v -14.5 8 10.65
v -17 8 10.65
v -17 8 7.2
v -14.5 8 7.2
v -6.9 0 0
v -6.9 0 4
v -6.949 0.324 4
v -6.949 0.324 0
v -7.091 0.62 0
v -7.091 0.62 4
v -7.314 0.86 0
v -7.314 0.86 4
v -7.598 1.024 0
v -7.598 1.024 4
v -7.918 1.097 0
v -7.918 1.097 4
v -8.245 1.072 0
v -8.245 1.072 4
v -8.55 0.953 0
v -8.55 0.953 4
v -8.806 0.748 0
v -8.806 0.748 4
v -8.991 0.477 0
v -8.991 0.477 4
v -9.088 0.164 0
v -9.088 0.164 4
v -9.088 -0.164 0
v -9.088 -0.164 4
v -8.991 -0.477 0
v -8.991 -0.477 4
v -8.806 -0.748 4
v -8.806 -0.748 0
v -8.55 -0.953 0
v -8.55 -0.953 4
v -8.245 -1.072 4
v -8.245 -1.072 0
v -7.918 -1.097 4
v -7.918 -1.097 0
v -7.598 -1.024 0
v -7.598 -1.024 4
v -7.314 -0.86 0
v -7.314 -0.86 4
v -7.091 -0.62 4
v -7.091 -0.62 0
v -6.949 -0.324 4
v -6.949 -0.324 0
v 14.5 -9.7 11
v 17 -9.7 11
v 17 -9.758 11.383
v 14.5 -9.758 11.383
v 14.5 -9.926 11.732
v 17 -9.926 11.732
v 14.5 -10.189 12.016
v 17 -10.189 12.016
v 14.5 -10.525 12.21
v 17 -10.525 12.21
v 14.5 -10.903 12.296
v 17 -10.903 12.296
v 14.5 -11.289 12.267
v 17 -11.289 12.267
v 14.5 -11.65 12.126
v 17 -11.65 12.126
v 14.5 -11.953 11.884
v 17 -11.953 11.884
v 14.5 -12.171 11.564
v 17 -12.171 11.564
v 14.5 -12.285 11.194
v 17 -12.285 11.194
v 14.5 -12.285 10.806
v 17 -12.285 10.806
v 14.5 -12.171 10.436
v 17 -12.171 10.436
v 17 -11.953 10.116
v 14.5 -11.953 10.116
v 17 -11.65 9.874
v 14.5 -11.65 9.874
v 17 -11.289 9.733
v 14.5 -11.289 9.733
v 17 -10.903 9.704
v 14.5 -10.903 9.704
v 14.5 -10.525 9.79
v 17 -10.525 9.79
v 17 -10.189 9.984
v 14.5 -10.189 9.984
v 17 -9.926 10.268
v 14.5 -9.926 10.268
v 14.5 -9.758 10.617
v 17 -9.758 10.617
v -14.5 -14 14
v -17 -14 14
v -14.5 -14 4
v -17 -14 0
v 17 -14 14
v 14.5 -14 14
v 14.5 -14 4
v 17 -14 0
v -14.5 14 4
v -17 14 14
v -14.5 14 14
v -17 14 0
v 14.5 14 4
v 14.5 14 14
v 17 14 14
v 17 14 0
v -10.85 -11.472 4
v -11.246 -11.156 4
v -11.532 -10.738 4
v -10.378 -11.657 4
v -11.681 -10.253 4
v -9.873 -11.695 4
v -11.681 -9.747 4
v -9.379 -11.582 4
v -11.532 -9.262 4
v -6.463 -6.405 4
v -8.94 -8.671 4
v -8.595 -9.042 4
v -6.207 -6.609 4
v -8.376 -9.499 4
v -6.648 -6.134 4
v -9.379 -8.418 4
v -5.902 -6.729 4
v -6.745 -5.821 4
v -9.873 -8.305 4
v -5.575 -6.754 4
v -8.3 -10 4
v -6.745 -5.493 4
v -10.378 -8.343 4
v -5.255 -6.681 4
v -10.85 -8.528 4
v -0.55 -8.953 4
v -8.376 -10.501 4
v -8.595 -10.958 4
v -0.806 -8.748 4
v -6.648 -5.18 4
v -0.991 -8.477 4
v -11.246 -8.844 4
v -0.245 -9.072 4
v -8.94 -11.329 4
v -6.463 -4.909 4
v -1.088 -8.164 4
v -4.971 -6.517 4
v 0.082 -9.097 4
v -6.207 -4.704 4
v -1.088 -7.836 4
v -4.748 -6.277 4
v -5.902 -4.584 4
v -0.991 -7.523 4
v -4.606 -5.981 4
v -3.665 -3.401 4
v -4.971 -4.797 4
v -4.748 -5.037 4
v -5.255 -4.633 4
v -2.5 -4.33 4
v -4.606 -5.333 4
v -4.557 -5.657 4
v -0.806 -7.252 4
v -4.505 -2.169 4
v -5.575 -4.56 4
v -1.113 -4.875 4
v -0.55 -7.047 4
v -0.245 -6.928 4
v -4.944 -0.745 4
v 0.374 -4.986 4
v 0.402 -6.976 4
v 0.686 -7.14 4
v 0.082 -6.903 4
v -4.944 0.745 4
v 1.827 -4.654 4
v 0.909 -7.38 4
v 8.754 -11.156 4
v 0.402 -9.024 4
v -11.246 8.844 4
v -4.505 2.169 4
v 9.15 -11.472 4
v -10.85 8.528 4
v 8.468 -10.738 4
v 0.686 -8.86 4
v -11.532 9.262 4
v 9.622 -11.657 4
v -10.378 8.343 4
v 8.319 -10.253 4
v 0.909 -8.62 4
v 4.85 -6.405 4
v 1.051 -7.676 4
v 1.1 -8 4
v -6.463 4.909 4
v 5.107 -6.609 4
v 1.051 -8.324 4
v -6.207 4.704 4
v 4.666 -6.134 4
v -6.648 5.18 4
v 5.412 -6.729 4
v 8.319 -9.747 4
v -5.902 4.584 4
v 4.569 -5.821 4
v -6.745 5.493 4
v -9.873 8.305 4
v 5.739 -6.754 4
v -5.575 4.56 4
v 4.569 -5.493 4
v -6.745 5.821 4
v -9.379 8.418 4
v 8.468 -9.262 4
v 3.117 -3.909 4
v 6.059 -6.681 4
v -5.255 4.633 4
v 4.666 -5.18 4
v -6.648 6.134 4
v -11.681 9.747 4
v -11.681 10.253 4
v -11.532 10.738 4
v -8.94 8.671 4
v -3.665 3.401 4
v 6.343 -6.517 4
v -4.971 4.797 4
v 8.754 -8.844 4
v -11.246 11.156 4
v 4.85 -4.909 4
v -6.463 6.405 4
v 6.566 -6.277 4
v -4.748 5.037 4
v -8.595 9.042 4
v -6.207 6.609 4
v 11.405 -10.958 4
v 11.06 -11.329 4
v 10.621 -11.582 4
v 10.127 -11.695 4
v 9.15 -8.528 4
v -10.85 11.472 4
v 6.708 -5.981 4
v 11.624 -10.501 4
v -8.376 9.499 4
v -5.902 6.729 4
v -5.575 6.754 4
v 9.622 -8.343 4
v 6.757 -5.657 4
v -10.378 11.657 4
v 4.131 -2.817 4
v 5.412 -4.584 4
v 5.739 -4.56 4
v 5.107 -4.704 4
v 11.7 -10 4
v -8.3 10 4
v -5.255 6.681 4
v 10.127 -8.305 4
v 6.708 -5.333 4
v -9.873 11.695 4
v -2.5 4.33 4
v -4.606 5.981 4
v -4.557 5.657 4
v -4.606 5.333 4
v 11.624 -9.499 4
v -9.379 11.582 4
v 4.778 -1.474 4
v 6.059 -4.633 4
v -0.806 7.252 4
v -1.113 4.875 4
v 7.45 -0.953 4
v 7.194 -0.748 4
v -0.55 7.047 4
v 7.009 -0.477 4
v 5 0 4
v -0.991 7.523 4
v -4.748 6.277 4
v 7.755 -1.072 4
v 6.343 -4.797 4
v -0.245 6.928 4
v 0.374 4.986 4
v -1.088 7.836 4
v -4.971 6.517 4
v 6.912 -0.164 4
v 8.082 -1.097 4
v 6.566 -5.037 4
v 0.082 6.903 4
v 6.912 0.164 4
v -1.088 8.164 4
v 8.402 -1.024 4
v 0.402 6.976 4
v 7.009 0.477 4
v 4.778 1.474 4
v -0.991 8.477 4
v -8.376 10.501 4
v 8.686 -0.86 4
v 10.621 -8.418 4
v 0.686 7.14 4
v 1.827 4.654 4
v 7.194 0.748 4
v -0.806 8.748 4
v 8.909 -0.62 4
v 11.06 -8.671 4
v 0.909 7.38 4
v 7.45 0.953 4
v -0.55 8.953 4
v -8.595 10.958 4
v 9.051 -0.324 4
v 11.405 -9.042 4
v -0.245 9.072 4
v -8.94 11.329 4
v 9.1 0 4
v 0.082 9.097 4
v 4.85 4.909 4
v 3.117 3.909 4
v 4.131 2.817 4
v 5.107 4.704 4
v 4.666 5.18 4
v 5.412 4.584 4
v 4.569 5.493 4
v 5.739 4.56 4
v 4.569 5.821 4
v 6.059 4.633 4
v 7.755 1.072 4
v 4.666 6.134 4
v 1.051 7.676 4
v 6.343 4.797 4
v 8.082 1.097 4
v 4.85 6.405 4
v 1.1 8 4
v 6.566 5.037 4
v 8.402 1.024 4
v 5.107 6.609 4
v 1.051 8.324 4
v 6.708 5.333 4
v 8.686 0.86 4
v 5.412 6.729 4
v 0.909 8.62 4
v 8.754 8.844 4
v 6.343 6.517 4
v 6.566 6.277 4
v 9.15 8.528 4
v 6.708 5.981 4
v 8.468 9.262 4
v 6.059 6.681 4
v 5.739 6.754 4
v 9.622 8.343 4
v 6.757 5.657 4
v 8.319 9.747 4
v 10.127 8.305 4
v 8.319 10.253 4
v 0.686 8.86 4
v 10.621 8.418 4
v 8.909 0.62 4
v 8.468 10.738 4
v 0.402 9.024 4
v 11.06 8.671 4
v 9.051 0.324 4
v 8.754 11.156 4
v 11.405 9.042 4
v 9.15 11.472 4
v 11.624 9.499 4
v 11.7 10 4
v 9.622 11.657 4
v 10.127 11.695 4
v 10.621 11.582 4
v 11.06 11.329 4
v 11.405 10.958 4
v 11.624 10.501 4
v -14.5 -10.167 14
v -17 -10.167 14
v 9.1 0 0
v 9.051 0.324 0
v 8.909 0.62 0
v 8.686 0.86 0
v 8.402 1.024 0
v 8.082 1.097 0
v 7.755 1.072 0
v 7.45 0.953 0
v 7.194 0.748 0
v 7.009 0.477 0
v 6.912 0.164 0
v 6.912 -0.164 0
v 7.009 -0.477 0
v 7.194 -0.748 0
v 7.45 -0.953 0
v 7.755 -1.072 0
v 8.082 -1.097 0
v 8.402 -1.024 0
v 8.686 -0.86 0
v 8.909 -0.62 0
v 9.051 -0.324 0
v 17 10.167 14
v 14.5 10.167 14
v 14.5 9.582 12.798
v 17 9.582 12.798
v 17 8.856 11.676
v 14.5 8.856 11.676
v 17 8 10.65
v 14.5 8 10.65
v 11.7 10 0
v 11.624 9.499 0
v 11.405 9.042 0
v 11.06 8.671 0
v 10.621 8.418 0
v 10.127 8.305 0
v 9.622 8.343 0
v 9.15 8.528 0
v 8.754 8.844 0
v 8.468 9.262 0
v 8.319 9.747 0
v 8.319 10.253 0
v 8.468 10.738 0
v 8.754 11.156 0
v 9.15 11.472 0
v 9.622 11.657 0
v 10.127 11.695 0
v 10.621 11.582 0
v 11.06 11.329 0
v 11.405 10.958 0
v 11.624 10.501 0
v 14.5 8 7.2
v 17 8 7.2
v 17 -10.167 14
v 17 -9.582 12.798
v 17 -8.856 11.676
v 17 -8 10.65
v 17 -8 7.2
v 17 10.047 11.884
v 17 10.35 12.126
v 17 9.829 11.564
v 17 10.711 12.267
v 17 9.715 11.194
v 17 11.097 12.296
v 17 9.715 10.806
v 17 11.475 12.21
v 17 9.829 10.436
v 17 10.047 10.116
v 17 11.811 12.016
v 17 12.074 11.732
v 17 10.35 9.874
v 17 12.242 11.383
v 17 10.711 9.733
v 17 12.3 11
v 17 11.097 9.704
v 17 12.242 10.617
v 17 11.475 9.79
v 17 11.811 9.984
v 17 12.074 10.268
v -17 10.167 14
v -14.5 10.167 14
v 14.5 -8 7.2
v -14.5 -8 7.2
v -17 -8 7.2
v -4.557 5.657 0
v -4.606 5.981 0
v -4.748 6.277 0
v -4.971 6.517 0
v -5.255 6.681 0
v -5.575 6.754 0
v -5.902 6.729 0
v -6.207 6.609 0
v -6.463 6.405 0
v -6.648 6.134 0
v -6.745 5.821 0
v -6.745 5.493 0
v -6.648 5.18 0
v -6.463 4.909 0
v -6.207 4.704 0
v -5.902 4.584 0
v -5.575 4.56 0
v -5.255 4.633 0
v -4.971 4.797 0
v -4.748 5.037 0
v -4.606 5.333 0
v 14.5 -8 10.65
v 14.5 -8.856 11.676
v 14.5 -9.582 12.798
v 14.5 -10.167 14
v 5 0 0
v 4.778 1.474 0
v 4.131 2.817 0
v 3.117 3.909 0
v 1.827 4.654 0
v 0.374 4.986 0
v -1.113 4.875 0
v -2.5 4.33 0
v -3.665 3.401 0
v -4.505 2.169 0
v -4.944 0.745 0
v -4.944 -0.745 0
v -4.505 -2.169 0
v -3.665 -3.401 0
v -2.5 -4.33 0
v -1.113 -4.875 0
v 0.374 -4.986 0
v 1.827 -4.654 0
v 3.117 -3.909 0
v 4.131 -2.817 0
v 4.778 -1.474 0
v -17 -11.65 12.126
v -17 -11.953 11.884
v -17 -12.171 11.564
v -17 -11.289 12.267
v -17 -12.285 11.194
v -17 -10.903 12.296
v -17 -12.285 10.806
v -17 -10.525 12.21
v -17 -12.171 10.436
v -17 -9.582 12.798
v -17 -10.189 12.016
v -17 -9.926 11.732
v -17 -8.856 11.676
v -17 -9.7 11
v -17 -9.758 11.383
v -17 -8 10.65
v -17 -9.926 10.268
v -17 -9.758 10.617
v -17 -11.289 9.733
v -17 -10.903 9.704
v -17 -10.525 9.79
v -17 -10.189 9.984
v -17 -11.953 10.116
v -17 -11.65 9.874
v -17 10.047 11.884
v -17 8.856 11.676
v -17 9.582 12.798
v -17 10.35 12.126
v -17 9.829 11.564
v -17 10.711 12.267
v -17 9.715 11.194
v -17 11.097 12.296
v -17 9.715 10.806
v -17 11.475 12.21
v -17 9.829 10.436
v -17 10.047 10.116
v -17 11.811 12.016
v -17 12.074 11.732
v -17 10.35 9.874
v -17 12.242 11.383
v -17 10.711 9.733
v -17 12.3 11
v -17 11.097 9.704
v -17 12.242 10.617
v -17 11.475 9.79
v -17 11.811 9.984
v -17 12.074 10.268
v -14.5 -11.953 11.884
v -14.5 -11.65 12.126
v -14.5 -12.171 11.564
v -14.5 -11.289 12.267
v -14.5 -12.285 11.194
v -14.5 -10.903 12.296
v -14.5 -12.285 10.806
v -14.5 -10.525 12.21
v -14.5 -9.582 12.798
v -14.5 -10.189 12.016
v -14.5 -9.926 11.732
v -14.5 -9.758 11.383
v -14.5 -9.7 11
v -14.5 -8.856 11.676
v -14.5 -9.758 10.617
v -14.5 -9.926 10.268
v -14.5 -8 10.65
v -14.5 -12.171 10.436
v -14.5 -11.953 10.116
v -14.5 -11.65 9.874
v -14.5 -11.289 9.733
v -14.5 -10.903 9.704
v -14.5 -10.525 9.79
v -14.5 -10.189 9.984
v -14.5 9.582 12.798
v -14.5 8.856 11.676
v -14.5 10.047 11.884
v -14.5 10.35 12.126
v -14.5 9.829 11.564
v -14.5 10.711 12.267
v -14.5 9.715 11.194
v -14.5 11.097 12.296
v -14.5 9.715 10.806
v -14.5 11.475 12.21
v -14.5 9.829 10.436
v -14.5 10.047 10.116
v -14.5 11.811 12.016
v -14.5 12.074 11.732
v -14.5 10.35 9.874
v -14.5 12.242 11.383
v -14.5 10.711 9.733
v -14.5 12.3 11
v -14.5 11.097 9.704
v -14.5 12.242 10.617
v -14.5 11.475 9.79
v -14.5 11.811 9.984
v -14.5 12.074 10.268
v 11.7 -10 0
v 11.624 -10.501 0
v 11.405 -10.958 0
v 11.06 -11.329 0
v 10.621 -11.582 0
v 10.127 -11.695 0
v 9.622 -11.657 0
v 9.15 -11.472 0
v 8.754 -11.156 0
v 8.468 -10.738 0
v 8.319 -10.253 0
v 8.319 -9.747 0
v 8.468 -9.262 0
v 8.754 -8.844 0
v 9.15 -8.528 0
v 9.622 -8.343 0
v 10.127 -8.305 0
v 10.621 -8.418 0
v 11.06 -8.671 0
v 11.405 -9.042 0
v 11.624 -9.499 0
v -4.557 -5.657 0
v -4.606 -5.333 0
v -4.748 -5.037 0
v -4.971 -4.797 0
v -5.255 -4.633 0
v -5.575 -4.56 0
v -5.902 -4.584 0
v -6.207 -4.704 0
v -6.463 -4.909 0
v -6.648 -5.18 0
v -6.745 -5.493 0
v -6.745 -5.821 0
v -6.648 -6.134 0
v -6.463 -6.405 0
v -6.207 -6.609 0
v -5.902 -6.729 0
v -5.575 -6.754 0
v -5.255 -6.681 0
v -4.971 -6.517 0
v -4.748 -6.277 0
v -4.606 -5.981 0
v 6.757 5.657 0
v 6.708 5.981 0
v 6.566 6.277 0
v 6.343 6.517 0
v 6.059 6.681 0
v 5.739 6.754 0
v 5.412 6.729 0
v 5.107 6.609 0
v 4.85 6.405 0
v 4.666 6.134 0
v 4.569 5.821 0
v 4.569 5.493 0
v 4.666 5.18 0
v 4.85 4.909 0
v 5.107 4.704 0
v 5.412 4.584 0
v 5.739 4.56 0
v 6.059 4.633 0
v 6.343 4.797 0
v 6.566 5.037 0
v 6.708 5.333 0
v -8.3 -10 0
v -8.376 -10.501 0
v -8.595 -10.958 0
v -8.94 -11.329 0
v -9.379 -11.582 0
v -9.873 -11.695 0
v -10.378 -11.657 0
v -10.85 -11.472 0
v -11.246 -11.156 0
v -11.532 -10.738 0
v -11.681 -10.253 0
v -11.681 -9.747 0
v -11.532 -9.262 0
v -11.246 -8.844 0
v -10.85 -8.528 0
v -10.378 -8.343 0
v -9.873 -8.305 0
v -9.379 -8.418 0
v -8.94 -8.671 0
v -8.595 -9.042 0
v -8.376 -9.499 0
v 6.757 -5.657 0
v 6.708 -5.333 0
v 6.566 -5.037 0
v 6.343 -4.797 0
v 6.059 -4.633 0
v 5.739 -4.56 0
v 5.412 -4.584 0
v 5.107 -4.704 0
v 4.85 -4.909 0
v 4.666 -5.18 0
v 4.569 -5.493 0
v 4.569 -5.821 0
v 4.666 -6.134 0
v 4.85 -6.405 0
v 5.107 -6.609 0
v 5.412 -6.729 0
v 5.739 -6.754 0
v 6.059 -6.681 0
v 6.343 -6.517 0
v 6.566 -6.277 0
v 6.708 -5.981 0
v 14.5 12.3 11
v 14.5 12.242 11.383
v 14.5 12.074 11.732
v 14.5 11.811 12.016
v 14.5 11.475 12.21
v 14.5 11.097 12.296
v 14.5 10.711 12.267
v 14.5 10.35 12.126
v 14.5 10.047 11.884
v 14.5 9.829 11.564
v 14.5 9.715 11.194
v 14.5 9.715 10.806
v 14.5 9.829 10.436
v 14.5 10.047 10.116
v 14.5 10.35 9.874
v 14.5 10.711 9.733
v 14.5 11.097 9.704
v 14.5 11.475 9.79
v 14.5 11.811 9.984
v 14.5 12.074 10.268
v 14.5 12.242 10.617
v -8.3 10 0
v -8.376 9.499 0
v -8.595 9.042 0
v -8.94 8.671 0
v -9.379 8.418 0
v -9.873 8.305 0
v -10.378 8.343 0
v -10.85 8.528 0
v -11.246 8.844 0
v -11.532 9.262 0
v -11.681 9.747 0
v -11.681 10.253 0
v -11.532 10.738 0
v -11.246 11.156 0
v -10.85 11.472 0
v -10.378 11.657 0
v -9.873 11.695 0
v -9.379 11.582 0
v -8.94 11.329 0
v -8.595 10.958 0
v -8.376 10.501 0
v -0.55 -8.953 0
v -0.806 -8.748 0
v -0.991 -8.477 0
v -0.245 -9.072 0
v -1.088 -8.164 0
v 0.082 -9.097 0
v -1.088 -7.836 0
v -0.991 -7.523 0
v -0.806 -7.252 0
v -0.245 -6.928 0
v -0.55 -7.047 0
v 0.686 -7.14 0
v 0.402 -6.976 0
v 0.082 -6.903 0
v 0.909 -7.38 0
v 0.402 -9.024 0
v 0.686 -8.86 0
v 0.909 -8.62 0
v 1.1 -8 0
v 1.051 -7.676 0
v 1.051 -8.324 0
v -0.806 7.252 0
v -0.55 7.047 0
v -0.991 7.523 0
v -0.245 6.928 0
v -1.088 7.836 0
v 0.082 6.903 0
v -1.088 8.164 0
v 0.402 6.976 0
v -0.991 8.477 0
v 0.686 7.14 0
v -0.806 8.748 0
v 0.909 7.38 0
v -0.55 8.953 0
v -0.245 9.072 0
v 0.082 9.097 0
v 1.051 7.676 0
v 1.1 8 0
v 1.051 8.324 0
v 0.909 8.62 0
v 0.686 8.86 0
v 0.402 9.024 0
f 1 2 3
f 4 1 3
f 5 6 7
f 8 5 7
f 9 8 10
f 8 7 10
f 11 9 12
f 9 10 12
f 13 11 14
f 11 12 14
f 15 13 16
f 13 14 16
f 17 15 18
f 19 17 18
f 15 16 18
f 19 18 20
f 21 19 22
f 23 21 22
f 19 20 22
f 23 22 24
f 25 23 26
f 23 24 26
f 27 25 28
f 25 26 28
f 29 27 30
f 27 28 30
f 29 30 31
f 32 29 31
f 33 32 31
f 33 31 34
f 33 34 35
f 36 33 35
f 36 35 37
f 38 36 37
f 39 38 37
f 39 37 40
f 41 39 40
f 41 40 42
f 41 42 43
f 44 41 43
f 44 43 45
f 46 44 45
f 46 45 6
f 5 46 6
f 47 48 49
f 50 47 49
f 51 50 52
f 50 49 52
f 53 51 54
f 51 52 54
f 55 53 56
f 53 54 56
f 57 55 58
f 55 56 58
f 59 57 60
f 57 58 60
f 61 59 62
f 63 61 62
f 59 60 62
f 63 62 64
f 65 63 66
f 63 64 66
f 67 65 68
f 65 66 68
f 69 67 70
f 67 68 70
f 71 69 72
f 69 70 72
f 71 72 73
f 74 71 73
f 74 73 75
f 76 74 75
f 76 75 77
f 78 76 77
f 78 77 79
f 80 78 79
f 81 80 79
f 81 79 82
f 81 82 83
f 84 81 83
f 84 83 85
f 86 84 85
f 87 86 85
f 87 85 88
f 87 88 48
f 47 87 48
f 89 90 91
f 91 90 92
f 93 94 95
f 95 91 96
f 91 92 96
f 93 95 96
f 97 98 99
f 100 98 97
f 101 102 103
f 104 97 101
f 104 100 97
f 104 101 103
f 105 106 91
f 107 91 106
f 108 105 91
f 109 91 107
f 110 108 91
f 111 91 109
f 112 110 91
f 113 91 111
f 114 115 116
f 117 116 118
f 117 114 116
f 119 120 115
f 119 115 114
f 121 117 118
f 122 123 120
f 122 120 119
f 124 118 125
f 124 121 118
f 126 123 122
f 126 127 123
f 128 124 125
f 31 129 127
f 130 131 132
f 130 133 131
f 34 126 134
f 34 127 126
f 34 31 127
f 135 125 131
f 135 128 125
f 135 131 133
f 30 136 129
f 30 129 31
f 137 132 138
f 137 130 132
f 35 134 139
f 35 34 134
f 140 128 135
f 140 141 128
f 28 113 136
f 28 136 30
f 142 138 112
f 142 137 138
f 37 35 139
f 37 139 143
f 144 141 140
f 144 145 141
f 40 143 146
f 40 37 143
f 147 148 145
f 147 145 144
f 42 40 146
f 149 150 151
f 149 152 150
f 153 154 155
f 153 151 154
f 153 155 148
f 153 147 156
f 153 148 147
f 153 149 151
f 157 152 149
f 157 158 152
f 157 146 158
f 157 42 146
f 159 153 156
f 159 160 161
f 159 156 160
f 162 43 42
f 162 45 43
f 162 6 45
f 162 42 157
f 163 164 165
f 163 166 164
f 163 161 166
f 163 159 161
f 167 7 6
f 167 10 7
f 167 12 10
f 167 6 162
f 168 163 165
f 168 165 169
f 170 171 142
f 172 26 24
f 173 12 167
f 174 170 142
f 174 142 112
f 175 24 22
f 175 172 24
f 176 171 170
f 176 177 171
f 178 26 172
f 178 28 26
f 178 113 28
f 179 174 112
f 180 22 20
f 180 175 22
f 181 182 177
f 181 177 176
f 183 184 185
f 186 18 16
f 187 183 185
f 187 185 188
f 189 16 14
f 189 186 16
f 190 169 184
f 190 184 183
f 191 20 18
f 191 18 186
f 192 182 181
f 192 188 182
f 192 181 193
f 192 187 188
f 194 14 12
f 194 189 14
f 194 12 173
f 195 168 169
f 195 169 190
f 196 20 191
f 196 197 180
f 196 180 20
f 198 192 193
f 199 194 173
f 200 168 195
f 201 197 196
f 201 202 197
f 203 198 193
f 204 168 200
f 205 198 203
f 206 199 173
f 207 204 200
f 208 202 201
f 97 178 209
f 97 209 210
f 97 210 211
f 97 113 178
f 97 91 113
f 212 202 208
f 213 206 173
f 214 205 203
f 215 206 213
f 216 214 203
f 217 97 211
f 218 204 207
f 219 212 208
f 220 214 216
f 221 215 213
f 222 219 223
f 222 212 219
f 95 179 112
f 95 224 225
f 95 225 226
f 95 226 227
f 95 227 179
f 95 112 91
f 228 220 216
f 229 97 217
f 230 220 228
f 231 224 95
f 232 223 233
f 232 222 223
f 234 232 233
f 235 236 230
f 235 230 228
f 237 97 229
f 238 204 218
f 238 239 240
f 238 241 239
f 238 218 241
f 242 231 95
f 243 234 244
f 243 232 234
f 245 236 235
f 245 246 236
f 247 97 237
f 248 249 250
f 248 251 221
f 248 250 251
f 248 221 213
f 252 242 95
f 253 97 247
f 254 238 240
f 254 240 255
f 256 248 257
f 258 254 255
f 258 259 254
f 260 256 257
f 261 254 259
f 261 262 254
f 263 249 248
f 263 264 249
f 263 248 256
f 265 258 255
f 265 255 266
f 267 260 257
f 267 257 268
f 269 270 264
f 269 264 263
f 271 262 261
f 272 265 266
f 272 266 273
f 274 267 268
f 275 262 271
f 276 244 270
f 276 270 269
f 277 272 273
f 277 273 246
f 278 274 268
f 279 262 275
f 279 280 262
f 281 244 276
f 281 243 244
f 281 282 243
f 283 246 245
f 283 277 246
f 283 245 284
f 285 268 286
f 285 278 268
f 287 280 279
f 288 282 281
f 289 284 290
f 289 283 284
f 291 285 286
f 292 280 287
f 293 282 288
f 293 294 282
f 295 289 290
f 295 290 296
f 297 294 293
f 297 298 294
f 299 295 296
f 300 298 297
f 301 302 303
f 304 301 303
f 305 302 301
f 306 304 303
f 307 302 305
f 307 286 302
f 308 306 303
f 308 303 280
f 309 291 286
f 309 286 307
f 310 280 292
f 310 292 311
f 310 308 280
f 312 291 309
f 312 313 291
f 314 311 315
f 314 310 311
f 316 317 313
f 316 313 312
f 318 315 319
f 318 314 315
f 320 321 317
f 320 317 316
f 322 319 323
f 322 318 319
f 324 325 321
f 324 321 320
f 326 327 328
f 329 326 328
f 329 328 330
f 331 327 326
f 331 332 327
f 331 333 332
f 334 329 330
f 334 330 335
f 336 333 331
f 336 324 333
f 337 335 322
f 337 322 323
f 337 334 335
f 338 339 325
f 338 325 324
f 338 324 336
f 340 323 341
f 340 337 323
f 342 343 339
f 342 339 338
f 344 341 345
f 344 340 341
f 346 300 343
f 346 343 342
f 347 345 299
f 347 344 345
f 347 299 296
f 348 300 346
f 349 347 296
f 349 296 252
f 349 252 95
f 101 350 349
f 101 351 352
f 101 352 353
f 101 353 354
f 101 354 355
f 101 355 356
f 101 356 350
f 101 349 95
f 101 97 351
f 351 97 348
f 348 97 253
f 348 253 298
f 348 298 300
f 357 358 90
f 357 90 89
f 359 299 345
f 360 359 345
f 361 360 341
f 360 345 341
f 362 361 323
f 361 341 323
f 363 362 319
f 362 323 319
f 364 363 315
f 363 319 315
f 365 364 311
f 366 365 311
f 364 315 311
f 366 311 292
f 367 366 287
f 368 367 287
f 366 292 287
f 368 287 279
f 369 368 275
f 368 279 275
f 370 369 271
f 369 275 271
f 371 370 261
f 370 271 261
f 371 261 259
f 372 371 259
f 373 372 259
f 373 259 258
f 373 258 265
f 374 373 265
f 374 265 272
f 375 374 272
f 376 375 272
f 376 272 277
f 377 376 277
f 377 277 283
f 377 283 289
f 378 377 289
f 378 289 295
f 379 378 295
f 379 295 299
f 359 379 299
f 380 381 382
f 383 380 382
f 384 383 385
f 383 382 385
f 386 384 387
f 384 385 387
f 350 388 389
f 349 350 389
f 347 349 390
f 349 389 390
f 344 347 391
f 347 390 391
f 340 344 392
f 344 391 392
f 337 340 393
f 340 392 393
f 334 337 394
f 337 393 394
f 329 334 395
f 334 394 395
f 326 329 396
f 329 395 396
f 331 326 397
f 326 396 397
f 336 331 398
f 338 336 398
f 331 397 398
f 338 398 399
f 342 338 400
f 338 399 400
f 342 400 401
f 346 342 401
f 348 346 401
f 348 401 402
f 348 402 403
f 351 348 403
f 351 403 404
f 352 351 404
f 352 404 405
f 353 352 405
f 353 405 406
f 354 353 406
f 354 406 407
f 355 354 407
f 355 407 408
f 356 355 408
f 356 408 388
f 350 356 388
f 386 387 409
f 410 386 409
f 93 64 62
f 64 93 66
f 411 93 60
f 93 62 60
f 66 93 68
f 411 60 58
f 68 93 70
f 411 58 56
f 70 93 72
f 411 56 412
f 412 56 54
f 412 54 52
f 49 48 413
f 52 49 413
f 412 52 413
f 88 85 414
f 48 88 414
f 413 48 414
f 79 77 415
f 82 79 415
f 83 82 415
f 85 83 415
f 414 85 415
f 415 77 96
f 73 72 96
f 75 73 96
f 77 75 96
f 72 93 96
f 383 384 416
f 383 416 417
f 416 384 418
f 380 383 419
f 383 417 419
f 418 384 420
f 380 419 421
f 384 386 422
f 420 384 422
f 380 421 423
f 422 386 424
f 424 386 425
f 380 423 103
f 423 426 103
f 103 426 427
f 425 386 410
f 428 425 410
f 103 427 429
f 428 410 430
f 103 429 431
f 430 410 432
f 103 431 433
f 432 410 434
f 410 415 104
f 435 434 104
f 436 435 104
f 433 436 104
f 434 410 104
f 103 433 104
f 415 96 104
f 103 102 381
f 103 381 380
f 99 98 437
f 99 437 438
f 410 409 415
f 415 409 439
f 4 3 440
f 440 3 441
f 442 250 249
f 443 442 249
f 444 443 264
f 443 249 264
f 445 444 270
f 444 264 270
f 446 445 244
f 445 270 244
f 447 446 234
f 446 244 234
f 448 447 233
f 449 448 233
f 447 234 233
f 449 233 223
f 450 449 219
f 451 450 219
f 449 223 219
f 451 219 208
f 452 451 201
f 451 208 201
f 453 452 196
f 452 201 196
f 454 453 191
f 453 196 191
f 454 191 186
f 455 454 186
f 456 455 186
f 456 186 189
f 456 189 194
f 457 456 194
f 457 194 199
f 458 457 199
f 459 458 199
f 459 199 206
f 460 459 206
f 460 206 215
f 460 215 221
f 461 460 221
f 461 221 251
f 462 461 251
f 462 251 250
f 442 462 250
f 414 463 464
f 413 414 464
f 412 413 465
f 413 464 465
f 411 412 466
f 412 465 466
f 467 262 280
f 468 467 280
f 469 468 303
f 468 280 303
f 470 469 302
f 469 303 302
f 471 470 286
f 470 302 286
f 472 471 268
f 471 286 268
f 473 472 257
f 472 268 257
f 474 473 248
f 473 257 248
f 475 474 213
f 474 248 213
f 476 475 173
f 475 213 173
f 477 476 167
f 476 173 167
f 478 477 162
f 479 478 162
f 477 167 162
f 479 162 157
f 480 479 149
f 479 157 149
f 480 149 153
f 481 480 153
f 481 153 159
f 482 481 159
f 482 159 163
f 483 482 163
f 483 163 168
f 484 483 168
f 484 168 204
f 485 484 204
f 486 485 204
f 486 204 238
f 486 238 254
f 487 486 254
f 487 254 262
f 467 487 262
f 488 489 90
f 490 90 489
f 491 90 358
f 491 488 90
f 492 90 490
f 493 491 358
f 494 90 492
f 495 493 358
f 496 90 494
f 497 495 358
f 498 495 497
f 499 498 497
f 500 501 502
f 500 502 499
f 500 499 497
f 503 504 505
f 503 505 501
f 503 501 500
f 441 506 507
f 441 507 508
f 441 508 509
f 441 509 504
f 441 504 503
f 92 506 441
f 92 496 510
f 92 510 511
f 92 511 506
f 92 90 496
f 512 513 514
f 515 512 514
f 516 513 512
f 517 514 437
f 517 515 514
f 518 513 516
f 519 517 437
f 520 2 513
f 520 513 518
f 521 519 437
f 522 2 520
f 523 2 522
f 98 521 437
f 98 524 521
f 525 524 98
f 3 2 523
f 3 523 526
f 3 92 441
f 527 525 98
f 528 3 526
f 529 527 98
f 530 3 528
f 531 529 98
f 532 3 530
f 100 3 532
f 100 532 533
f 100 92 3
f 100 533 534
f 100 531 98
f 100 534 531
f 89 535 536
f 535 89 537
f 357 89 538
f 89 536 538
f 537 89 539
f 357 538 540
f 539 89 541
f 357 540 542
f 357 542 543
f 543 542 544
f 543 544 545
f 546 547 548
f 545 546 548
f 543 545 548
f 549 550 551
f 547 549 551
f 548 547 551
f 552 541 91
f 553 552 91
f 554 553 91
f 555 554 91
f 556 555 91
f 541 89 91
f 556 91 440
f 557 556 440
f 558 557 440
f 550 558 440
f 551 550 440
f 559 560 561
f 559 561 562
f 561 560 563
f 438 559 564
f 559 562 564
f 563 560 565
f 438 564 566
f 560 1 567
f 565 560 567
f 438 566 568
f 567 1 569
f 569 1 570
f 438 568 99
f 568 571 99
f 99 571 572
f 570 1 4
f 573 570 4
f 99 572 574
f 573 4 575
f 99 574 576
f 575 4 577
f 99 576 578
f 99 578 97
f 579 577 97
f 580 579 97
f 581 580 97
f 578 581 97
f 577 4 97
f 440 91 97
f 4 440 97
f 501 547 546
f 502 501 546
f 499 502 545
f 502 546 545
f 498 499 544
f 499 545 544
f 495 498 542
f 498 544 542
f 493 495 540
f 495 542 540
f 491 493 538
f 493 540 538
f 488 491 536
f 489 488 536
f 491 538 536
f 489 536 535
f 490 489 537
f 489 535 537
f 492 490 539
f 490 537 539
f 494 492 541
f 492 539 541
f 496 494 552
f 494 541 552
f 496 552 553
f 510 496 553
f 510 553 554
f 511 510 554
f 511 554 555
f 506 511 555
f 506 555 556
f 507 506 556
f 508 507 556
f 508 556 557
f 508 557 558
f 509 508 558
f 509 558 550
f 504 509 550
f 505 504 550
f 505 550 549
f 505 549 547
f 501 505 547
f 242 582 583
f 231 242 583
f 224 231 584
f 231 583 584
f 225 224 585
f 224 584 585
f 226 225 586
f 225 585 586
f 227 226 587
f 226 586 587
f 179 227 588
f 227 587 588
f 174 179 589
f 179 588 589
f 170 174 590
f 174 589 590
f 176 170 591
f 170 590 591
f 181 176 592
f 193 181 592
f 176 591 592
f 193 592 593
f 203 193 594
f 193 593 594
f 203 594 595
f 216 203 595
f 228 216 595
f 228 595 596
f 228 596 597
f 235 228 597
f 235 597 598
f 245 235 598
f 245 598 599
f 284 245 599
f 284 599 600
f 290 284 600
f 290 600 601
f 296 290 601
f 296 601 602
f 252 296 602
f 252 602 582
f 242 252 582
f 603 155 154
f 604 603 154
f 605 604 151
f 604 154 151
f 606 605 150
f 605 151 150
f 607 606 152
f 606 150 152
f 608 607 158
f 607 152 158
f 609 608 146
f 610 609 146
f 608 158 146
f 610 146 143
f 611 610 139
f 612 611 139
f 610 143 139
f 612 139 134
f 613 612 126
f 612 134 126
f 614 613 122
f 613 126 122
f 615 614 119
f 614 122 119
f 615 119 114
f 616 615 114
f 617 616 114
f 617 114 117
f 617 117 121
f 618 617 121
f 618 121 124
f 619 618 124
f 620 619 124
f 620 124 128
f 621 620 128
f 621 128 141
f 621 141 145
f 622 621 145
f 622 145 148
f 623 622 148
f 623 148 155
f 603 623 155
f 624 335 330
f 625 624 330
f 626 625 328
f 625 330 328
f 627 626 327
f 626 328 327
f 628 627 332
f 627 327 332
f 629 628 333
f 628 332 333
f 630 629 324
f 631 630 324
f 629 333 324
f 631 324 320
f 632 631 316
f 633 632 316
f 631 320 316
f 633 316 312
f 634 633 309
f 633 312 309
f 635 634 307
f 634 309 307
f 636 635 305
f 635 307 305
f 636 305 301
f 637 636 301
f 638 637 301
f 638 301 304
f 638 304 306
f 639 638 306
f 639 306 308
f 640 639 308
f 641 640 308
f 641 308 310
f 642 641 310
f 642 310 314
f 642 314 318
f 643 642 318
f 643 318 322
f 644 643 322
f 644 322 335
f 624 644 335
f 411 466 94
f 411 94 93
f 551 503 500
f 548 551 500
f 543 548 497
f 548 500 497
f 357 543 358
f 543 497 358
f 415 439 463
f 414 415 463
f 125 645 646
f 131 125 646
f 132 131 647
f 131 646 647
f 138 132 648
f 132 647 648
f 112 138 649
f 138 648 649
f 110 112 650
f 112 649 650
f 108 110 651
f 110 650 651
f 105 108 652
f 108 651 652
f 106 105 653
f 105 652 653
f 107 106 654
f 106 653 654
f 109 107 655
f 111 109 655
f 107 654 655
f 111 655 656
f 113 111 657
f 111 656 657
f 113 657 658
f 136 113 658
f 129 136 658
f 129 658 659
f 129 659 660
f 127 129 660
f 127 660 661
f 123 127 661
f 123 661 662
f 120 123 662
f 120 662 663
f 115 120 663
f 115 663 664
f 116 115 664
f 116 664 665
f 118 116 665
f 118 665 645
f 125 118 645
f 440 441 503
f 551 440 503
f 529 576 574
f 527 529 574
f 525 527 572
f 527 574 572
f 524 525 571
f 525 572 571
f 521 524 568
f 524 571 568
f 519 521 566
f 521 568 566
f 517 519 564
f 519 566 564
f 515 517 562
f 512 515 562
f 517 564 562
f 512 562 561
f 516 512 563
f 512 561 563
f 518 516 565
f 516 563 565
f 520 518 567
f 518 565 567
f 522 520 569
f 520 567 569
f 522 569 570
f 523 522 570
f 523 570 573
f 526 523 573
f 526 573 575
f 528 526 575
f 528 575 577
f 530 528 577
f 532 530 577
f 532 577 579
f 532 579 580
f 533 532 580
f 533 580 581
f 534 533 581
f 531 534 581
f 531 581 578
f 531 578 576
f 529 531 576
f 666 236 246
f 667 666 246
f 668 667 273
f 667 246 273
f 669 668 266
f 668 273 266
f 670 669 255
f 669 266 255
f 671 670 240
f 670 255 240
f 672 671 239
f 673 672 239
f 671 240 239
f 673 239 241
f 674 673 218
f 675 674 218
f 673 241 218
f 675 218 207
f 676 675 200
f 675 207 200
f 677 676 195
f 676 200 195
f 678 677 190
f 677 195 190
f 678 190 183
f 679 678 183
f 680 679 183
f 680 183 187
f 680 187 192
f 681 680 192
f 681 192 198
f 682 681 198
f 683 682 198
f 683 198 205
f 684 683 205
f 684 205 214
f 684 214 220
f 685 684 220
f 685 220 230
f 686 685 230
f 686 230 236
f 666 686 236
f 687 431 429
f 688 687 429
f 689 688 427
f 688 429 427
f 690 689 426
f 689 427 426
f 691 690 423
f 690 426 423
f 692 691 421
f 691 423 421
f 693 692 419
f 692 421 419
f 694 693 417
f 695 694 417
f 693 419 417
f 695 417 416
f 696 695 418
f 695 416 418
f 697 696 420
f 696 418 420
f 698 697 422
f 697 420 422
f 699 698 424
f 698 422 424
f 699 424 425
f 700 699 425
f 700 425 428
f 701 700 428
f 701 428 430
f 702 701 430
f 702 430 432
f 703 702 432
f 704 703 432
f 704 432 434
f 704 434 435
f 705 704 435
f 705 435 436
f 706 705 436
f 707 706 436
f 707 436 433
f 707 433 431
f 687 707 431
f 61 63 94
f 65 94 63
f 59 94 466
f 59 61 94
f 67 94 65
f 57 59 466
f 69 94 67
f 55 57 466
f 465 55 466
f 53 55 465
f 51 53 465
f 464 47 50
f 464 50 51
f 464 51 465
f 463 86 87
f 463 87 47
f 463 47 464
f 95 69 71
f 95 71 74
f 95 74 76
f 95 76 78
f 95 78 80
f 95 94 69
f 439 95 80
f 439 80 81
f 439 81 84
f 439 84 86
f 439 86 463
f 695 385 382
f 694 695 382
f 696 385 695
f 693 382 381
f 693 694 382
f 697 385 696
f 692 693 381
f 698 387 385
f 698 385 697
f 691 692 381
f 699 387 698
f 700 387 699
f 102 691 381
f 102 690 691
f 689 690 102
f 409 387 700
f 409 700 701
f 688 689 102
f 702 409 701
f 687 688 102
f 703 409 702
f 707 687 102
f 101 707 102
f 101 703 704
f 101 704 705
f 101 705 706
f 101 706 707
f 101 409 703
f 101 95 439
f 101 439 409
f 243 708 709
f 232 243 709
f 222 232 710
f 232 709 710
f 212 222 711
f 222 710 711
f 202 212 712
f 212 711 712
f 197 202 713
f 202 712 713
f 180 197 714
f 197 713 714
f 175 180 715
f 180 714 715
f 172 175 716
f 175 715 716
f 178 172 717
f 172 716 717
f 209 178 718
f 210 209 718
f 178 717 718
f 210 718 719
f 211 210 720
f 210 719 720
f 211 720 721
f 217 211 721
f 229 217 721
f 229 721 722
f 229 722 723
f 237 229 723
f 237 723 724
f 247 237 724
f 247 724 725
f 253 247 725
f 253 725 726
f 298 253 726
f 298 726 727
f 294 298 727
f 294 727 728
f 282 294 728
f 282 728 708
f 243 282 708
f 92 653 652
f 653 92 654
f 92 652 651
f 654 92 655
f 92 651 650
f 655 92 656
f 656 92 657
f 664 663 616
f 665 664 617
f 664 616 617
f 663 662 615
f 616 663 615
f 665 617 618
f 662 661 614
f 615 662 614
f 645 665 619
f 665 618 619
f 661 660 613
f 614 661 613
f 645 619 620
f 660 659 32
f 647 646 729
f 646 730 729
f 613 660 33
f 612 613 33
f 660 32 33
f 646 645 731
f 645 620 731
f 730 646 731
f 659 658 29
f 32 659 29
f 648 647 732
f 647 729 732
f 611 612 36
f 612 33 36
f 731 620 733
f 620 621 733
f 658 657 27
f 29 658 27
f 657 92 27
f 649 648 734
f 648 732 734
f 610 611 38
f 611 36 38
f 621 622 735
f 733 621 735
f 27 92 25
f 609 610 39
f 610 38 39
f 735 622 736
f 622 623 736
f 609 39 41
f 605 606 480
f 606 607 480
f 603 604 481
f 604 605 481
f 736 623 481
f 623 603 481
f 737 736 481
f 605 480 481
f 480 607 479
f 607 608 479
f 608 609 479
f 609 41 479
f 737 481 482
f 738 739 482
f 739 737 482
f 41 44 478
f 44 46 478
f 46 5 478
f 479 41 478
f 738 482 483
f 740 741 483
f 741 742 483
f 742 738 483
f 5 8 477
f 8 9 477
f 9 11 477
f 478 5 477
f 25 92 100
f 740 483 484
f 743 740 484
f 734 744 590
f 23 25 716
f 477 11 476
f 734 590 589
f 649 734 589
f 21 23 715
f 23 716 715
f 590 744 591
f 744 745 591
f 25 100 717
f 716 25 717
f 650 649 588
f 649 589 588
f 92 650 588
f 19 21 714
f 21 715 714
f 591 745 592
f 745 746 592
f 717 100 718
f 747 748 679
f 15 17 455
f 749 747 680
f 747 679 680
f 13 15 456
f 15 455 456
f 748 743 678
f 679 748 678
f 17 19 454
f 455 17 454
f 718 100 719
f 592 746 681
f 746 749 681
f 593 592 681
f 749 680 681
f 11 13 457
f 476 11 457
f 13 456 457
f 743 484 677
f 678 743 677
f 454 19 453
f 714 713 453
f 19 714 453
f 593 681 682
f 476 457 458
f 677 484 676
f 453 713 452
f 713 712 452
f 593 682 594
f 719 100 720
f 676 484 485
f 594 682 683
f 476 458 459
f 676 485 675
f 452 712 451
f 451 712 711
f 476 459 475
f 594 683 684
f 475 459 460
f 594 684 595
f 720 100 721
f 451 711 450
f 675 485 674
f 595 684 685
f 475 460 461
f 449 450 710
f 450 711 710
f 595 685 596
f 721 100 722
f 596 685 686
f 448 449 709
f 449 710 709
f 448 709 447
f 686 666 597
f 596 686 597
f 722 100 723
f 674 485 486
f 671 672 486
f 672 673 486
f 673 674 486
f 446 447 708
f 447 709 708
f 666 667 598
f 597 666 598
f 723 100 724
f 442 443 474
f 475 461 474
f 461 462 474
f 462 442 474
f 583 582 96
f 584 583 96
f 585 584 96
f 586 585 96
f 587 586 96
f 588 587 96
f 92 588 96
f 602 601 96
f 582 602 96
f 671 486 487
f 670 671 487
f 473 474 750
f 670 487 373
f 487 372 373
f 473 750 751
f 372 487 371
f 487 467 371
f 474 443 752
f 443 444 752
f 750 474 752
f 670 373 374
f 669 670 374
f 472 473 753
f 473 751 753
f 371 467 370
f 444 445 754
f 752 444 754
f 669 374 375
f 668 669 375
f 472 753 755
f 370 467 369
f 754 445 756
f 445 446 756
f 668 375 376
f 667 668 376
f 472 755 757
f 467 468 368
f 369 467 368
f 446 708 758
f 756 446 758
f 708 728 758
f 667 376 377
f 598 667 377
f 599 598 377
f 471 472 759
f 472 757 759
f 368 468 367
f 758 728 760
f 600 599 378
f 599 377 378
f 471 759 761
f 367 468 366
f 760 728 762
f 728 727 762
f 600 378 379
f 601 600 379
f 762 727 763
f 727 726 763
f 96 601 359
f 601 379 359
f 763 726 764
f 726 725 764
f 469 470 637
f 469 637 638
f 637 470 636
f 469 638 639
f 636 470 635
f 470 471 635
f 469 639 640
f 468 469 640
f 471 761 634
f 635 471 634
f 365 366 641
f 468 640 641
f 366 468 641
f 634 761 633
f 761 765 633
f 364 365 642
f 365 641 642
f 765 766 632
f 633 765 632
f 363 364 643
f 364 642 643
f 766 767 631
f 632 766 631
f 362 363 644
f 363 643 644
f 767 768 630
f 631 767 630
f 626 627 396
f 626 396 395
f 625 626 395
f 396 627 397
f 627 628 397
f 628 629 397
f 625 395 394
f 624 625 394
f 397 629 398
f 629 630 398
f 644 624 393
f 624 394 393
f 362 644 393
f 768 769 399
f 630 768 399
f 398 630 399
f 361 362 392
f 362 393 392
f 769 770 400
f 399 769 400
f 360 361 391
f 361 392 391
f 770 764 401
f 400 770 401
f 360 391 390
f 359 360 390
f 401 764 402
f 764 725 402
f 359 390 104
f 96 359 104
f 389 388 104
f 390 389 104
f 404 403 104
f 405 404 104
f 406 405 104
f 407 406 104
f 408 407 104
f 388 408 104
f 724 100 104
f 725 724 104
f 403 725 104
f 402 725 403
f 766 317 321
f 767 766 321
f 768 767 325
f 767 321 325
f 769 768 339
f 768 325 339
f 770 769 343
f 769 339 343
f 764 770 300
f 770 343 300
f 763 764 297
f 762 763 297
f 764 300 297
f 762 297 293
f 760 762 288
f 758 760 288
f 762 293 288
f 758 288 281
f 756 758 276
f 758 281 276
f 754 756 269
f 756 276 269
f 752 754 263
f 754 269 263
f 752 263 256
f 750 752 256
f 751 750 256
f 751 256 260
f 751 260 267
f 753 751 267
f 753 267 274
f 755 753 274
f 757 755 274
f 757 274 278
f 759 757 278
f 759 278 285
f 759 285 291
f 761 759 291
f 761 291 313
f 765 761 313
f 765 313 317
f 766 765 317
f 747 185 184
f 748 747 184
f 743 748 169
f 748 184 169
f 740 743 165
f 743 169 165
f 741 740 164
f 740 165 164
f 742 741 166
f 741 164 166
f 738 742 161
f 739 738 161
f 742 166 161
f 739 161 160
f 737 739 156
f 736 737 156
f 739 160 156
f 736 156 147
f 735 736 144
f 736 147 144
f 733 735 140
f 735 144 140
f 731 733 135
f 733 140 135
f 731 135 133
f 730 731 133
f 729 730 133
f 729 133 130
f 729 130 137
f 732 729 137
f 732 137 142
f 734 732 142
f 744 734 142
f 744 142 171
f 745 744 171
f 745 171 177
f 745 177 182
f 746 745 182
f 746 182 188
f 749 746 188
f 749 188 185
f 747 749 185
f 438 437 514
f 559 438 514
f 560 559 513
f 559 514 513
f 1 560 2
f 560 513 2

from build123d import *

# Parameters (mm, degrees)
SKETCH_W        = 34
SKETCH_H        = 28
PAD_DEPTH       = 4
SKETCH001_W     = 2.5
SKETCH001_H     = 28
PAD001_DEPTH    = 10
SKETCH002_R     = 1.3
POCKET_DEPTH    = 100
POCKET003_DEPTH = 100
SKETCH004_R     = 1.1
SKETCH004_R_2   = 5
POCKET007_DEPTH = 5
SKETCH008_R     = 1.7
POCKET009_DEPTH = 10


with BuildPart() as part:
    # Sketch → Pad (new body)
    with BuildSketch(Plane.XY):
        Rectangle(SKETCH_W, SKETCH_H)
    extrude(amount=PAD_DEPTH)

    # Sketch001 (on Face6 of Pad) → Pad001 (join)
    with BuildSketch(Plane.XY.offset(4)):
        with Locations((15.75, 0)):
            Rectangle(SKETCH001_W, SKETCH001_H)
        with Locations((-15.75, 0)):
            Rectangle(SKETCH001_W, SKETCH001_H)
    extrude(amount=PAD001_DEPTH)

    # Sketch002 (on Face13 of Pad001) → Pocket (cut)
    with BuildSketch(Plane.YZ.offset(17)):
        with Locations((-11, 11)):
            Circle(SKETCH002_R)
        with Locations((11, 11)):
            Circle(SKETCH002_R)
    extrude(amount=-POCKET_DEPTH, mode=Mode.SUBTRACT)

    # Sketch006 → Pocket003 (cut)
    with BuildSketch(Plane(origin=(-20, 0, 0), x_dir=(0, -1, 0), z_dir=(-1, 0, 0))):
        with BuildLine():
            ThreePointArc((8, 10.650166), (0, 29.2), (-8, 10.650166))
            Line((-8, 10.650166), (-8, 7.2))
            Line((-8, 7.2), (8, 7.2))
            Line((8, 7.2), (8, 10.650166))
        make_face()
    extrude(amount=-POCKET003_DEPTH, mode=Mode.SUBTRACT)

    # Sketch004 → Pocket007 (cut)
    with BuildSketch(Plane.XY.offset(4)):
        with Locations((0, 8)):
            Circle(SKETCH004_R)
        with Locations((8, 0)):
            Circle(SKETCH004_R)
        with Locations((0, -8)):
            Circle(SKETCH004_R)
        with Locations((-8, 0)):
            Circle(SKETCH004_R)
        Circle(SKETCH004_R_2)
        with Locations((5.656854, 5.656854)):
            Circle(SKETCH004_R)
        with Locations((-5.656854, 5.656854)):
            Circle(SKETCH004_R)
        with Locations((-5.656854, -5.656854)):
            Circle(SKETCH004_R)
        with Locations((5.656854, -5.656854)):
            Circle(SKETCH004_R)
    extrude(amount=-POCKET007_DEPTH, mode=Mode.SUBTRACT)

    # Sketch008 → Pocket009 (cut)
    with BuildSketch(Plane(origin=(0, 0, 0), x_dir=(1, 0, 0), z_dir=(0, 0, -1))):
        with Locations((10, 10)):
            Circle(SKETCH008_R)
        with Locations((-10, 10)):
            Circle(SKETCH008_R)
        with Locations((-10, -10)):
            Circle(SKETCH008_R)
        with Locations((10, -10)):
            Circle(SKETCH008_R)
    extrude(amount=-POCKET009_DEPTH, mode=Mode.SUBTRACT)


solid = part.part
